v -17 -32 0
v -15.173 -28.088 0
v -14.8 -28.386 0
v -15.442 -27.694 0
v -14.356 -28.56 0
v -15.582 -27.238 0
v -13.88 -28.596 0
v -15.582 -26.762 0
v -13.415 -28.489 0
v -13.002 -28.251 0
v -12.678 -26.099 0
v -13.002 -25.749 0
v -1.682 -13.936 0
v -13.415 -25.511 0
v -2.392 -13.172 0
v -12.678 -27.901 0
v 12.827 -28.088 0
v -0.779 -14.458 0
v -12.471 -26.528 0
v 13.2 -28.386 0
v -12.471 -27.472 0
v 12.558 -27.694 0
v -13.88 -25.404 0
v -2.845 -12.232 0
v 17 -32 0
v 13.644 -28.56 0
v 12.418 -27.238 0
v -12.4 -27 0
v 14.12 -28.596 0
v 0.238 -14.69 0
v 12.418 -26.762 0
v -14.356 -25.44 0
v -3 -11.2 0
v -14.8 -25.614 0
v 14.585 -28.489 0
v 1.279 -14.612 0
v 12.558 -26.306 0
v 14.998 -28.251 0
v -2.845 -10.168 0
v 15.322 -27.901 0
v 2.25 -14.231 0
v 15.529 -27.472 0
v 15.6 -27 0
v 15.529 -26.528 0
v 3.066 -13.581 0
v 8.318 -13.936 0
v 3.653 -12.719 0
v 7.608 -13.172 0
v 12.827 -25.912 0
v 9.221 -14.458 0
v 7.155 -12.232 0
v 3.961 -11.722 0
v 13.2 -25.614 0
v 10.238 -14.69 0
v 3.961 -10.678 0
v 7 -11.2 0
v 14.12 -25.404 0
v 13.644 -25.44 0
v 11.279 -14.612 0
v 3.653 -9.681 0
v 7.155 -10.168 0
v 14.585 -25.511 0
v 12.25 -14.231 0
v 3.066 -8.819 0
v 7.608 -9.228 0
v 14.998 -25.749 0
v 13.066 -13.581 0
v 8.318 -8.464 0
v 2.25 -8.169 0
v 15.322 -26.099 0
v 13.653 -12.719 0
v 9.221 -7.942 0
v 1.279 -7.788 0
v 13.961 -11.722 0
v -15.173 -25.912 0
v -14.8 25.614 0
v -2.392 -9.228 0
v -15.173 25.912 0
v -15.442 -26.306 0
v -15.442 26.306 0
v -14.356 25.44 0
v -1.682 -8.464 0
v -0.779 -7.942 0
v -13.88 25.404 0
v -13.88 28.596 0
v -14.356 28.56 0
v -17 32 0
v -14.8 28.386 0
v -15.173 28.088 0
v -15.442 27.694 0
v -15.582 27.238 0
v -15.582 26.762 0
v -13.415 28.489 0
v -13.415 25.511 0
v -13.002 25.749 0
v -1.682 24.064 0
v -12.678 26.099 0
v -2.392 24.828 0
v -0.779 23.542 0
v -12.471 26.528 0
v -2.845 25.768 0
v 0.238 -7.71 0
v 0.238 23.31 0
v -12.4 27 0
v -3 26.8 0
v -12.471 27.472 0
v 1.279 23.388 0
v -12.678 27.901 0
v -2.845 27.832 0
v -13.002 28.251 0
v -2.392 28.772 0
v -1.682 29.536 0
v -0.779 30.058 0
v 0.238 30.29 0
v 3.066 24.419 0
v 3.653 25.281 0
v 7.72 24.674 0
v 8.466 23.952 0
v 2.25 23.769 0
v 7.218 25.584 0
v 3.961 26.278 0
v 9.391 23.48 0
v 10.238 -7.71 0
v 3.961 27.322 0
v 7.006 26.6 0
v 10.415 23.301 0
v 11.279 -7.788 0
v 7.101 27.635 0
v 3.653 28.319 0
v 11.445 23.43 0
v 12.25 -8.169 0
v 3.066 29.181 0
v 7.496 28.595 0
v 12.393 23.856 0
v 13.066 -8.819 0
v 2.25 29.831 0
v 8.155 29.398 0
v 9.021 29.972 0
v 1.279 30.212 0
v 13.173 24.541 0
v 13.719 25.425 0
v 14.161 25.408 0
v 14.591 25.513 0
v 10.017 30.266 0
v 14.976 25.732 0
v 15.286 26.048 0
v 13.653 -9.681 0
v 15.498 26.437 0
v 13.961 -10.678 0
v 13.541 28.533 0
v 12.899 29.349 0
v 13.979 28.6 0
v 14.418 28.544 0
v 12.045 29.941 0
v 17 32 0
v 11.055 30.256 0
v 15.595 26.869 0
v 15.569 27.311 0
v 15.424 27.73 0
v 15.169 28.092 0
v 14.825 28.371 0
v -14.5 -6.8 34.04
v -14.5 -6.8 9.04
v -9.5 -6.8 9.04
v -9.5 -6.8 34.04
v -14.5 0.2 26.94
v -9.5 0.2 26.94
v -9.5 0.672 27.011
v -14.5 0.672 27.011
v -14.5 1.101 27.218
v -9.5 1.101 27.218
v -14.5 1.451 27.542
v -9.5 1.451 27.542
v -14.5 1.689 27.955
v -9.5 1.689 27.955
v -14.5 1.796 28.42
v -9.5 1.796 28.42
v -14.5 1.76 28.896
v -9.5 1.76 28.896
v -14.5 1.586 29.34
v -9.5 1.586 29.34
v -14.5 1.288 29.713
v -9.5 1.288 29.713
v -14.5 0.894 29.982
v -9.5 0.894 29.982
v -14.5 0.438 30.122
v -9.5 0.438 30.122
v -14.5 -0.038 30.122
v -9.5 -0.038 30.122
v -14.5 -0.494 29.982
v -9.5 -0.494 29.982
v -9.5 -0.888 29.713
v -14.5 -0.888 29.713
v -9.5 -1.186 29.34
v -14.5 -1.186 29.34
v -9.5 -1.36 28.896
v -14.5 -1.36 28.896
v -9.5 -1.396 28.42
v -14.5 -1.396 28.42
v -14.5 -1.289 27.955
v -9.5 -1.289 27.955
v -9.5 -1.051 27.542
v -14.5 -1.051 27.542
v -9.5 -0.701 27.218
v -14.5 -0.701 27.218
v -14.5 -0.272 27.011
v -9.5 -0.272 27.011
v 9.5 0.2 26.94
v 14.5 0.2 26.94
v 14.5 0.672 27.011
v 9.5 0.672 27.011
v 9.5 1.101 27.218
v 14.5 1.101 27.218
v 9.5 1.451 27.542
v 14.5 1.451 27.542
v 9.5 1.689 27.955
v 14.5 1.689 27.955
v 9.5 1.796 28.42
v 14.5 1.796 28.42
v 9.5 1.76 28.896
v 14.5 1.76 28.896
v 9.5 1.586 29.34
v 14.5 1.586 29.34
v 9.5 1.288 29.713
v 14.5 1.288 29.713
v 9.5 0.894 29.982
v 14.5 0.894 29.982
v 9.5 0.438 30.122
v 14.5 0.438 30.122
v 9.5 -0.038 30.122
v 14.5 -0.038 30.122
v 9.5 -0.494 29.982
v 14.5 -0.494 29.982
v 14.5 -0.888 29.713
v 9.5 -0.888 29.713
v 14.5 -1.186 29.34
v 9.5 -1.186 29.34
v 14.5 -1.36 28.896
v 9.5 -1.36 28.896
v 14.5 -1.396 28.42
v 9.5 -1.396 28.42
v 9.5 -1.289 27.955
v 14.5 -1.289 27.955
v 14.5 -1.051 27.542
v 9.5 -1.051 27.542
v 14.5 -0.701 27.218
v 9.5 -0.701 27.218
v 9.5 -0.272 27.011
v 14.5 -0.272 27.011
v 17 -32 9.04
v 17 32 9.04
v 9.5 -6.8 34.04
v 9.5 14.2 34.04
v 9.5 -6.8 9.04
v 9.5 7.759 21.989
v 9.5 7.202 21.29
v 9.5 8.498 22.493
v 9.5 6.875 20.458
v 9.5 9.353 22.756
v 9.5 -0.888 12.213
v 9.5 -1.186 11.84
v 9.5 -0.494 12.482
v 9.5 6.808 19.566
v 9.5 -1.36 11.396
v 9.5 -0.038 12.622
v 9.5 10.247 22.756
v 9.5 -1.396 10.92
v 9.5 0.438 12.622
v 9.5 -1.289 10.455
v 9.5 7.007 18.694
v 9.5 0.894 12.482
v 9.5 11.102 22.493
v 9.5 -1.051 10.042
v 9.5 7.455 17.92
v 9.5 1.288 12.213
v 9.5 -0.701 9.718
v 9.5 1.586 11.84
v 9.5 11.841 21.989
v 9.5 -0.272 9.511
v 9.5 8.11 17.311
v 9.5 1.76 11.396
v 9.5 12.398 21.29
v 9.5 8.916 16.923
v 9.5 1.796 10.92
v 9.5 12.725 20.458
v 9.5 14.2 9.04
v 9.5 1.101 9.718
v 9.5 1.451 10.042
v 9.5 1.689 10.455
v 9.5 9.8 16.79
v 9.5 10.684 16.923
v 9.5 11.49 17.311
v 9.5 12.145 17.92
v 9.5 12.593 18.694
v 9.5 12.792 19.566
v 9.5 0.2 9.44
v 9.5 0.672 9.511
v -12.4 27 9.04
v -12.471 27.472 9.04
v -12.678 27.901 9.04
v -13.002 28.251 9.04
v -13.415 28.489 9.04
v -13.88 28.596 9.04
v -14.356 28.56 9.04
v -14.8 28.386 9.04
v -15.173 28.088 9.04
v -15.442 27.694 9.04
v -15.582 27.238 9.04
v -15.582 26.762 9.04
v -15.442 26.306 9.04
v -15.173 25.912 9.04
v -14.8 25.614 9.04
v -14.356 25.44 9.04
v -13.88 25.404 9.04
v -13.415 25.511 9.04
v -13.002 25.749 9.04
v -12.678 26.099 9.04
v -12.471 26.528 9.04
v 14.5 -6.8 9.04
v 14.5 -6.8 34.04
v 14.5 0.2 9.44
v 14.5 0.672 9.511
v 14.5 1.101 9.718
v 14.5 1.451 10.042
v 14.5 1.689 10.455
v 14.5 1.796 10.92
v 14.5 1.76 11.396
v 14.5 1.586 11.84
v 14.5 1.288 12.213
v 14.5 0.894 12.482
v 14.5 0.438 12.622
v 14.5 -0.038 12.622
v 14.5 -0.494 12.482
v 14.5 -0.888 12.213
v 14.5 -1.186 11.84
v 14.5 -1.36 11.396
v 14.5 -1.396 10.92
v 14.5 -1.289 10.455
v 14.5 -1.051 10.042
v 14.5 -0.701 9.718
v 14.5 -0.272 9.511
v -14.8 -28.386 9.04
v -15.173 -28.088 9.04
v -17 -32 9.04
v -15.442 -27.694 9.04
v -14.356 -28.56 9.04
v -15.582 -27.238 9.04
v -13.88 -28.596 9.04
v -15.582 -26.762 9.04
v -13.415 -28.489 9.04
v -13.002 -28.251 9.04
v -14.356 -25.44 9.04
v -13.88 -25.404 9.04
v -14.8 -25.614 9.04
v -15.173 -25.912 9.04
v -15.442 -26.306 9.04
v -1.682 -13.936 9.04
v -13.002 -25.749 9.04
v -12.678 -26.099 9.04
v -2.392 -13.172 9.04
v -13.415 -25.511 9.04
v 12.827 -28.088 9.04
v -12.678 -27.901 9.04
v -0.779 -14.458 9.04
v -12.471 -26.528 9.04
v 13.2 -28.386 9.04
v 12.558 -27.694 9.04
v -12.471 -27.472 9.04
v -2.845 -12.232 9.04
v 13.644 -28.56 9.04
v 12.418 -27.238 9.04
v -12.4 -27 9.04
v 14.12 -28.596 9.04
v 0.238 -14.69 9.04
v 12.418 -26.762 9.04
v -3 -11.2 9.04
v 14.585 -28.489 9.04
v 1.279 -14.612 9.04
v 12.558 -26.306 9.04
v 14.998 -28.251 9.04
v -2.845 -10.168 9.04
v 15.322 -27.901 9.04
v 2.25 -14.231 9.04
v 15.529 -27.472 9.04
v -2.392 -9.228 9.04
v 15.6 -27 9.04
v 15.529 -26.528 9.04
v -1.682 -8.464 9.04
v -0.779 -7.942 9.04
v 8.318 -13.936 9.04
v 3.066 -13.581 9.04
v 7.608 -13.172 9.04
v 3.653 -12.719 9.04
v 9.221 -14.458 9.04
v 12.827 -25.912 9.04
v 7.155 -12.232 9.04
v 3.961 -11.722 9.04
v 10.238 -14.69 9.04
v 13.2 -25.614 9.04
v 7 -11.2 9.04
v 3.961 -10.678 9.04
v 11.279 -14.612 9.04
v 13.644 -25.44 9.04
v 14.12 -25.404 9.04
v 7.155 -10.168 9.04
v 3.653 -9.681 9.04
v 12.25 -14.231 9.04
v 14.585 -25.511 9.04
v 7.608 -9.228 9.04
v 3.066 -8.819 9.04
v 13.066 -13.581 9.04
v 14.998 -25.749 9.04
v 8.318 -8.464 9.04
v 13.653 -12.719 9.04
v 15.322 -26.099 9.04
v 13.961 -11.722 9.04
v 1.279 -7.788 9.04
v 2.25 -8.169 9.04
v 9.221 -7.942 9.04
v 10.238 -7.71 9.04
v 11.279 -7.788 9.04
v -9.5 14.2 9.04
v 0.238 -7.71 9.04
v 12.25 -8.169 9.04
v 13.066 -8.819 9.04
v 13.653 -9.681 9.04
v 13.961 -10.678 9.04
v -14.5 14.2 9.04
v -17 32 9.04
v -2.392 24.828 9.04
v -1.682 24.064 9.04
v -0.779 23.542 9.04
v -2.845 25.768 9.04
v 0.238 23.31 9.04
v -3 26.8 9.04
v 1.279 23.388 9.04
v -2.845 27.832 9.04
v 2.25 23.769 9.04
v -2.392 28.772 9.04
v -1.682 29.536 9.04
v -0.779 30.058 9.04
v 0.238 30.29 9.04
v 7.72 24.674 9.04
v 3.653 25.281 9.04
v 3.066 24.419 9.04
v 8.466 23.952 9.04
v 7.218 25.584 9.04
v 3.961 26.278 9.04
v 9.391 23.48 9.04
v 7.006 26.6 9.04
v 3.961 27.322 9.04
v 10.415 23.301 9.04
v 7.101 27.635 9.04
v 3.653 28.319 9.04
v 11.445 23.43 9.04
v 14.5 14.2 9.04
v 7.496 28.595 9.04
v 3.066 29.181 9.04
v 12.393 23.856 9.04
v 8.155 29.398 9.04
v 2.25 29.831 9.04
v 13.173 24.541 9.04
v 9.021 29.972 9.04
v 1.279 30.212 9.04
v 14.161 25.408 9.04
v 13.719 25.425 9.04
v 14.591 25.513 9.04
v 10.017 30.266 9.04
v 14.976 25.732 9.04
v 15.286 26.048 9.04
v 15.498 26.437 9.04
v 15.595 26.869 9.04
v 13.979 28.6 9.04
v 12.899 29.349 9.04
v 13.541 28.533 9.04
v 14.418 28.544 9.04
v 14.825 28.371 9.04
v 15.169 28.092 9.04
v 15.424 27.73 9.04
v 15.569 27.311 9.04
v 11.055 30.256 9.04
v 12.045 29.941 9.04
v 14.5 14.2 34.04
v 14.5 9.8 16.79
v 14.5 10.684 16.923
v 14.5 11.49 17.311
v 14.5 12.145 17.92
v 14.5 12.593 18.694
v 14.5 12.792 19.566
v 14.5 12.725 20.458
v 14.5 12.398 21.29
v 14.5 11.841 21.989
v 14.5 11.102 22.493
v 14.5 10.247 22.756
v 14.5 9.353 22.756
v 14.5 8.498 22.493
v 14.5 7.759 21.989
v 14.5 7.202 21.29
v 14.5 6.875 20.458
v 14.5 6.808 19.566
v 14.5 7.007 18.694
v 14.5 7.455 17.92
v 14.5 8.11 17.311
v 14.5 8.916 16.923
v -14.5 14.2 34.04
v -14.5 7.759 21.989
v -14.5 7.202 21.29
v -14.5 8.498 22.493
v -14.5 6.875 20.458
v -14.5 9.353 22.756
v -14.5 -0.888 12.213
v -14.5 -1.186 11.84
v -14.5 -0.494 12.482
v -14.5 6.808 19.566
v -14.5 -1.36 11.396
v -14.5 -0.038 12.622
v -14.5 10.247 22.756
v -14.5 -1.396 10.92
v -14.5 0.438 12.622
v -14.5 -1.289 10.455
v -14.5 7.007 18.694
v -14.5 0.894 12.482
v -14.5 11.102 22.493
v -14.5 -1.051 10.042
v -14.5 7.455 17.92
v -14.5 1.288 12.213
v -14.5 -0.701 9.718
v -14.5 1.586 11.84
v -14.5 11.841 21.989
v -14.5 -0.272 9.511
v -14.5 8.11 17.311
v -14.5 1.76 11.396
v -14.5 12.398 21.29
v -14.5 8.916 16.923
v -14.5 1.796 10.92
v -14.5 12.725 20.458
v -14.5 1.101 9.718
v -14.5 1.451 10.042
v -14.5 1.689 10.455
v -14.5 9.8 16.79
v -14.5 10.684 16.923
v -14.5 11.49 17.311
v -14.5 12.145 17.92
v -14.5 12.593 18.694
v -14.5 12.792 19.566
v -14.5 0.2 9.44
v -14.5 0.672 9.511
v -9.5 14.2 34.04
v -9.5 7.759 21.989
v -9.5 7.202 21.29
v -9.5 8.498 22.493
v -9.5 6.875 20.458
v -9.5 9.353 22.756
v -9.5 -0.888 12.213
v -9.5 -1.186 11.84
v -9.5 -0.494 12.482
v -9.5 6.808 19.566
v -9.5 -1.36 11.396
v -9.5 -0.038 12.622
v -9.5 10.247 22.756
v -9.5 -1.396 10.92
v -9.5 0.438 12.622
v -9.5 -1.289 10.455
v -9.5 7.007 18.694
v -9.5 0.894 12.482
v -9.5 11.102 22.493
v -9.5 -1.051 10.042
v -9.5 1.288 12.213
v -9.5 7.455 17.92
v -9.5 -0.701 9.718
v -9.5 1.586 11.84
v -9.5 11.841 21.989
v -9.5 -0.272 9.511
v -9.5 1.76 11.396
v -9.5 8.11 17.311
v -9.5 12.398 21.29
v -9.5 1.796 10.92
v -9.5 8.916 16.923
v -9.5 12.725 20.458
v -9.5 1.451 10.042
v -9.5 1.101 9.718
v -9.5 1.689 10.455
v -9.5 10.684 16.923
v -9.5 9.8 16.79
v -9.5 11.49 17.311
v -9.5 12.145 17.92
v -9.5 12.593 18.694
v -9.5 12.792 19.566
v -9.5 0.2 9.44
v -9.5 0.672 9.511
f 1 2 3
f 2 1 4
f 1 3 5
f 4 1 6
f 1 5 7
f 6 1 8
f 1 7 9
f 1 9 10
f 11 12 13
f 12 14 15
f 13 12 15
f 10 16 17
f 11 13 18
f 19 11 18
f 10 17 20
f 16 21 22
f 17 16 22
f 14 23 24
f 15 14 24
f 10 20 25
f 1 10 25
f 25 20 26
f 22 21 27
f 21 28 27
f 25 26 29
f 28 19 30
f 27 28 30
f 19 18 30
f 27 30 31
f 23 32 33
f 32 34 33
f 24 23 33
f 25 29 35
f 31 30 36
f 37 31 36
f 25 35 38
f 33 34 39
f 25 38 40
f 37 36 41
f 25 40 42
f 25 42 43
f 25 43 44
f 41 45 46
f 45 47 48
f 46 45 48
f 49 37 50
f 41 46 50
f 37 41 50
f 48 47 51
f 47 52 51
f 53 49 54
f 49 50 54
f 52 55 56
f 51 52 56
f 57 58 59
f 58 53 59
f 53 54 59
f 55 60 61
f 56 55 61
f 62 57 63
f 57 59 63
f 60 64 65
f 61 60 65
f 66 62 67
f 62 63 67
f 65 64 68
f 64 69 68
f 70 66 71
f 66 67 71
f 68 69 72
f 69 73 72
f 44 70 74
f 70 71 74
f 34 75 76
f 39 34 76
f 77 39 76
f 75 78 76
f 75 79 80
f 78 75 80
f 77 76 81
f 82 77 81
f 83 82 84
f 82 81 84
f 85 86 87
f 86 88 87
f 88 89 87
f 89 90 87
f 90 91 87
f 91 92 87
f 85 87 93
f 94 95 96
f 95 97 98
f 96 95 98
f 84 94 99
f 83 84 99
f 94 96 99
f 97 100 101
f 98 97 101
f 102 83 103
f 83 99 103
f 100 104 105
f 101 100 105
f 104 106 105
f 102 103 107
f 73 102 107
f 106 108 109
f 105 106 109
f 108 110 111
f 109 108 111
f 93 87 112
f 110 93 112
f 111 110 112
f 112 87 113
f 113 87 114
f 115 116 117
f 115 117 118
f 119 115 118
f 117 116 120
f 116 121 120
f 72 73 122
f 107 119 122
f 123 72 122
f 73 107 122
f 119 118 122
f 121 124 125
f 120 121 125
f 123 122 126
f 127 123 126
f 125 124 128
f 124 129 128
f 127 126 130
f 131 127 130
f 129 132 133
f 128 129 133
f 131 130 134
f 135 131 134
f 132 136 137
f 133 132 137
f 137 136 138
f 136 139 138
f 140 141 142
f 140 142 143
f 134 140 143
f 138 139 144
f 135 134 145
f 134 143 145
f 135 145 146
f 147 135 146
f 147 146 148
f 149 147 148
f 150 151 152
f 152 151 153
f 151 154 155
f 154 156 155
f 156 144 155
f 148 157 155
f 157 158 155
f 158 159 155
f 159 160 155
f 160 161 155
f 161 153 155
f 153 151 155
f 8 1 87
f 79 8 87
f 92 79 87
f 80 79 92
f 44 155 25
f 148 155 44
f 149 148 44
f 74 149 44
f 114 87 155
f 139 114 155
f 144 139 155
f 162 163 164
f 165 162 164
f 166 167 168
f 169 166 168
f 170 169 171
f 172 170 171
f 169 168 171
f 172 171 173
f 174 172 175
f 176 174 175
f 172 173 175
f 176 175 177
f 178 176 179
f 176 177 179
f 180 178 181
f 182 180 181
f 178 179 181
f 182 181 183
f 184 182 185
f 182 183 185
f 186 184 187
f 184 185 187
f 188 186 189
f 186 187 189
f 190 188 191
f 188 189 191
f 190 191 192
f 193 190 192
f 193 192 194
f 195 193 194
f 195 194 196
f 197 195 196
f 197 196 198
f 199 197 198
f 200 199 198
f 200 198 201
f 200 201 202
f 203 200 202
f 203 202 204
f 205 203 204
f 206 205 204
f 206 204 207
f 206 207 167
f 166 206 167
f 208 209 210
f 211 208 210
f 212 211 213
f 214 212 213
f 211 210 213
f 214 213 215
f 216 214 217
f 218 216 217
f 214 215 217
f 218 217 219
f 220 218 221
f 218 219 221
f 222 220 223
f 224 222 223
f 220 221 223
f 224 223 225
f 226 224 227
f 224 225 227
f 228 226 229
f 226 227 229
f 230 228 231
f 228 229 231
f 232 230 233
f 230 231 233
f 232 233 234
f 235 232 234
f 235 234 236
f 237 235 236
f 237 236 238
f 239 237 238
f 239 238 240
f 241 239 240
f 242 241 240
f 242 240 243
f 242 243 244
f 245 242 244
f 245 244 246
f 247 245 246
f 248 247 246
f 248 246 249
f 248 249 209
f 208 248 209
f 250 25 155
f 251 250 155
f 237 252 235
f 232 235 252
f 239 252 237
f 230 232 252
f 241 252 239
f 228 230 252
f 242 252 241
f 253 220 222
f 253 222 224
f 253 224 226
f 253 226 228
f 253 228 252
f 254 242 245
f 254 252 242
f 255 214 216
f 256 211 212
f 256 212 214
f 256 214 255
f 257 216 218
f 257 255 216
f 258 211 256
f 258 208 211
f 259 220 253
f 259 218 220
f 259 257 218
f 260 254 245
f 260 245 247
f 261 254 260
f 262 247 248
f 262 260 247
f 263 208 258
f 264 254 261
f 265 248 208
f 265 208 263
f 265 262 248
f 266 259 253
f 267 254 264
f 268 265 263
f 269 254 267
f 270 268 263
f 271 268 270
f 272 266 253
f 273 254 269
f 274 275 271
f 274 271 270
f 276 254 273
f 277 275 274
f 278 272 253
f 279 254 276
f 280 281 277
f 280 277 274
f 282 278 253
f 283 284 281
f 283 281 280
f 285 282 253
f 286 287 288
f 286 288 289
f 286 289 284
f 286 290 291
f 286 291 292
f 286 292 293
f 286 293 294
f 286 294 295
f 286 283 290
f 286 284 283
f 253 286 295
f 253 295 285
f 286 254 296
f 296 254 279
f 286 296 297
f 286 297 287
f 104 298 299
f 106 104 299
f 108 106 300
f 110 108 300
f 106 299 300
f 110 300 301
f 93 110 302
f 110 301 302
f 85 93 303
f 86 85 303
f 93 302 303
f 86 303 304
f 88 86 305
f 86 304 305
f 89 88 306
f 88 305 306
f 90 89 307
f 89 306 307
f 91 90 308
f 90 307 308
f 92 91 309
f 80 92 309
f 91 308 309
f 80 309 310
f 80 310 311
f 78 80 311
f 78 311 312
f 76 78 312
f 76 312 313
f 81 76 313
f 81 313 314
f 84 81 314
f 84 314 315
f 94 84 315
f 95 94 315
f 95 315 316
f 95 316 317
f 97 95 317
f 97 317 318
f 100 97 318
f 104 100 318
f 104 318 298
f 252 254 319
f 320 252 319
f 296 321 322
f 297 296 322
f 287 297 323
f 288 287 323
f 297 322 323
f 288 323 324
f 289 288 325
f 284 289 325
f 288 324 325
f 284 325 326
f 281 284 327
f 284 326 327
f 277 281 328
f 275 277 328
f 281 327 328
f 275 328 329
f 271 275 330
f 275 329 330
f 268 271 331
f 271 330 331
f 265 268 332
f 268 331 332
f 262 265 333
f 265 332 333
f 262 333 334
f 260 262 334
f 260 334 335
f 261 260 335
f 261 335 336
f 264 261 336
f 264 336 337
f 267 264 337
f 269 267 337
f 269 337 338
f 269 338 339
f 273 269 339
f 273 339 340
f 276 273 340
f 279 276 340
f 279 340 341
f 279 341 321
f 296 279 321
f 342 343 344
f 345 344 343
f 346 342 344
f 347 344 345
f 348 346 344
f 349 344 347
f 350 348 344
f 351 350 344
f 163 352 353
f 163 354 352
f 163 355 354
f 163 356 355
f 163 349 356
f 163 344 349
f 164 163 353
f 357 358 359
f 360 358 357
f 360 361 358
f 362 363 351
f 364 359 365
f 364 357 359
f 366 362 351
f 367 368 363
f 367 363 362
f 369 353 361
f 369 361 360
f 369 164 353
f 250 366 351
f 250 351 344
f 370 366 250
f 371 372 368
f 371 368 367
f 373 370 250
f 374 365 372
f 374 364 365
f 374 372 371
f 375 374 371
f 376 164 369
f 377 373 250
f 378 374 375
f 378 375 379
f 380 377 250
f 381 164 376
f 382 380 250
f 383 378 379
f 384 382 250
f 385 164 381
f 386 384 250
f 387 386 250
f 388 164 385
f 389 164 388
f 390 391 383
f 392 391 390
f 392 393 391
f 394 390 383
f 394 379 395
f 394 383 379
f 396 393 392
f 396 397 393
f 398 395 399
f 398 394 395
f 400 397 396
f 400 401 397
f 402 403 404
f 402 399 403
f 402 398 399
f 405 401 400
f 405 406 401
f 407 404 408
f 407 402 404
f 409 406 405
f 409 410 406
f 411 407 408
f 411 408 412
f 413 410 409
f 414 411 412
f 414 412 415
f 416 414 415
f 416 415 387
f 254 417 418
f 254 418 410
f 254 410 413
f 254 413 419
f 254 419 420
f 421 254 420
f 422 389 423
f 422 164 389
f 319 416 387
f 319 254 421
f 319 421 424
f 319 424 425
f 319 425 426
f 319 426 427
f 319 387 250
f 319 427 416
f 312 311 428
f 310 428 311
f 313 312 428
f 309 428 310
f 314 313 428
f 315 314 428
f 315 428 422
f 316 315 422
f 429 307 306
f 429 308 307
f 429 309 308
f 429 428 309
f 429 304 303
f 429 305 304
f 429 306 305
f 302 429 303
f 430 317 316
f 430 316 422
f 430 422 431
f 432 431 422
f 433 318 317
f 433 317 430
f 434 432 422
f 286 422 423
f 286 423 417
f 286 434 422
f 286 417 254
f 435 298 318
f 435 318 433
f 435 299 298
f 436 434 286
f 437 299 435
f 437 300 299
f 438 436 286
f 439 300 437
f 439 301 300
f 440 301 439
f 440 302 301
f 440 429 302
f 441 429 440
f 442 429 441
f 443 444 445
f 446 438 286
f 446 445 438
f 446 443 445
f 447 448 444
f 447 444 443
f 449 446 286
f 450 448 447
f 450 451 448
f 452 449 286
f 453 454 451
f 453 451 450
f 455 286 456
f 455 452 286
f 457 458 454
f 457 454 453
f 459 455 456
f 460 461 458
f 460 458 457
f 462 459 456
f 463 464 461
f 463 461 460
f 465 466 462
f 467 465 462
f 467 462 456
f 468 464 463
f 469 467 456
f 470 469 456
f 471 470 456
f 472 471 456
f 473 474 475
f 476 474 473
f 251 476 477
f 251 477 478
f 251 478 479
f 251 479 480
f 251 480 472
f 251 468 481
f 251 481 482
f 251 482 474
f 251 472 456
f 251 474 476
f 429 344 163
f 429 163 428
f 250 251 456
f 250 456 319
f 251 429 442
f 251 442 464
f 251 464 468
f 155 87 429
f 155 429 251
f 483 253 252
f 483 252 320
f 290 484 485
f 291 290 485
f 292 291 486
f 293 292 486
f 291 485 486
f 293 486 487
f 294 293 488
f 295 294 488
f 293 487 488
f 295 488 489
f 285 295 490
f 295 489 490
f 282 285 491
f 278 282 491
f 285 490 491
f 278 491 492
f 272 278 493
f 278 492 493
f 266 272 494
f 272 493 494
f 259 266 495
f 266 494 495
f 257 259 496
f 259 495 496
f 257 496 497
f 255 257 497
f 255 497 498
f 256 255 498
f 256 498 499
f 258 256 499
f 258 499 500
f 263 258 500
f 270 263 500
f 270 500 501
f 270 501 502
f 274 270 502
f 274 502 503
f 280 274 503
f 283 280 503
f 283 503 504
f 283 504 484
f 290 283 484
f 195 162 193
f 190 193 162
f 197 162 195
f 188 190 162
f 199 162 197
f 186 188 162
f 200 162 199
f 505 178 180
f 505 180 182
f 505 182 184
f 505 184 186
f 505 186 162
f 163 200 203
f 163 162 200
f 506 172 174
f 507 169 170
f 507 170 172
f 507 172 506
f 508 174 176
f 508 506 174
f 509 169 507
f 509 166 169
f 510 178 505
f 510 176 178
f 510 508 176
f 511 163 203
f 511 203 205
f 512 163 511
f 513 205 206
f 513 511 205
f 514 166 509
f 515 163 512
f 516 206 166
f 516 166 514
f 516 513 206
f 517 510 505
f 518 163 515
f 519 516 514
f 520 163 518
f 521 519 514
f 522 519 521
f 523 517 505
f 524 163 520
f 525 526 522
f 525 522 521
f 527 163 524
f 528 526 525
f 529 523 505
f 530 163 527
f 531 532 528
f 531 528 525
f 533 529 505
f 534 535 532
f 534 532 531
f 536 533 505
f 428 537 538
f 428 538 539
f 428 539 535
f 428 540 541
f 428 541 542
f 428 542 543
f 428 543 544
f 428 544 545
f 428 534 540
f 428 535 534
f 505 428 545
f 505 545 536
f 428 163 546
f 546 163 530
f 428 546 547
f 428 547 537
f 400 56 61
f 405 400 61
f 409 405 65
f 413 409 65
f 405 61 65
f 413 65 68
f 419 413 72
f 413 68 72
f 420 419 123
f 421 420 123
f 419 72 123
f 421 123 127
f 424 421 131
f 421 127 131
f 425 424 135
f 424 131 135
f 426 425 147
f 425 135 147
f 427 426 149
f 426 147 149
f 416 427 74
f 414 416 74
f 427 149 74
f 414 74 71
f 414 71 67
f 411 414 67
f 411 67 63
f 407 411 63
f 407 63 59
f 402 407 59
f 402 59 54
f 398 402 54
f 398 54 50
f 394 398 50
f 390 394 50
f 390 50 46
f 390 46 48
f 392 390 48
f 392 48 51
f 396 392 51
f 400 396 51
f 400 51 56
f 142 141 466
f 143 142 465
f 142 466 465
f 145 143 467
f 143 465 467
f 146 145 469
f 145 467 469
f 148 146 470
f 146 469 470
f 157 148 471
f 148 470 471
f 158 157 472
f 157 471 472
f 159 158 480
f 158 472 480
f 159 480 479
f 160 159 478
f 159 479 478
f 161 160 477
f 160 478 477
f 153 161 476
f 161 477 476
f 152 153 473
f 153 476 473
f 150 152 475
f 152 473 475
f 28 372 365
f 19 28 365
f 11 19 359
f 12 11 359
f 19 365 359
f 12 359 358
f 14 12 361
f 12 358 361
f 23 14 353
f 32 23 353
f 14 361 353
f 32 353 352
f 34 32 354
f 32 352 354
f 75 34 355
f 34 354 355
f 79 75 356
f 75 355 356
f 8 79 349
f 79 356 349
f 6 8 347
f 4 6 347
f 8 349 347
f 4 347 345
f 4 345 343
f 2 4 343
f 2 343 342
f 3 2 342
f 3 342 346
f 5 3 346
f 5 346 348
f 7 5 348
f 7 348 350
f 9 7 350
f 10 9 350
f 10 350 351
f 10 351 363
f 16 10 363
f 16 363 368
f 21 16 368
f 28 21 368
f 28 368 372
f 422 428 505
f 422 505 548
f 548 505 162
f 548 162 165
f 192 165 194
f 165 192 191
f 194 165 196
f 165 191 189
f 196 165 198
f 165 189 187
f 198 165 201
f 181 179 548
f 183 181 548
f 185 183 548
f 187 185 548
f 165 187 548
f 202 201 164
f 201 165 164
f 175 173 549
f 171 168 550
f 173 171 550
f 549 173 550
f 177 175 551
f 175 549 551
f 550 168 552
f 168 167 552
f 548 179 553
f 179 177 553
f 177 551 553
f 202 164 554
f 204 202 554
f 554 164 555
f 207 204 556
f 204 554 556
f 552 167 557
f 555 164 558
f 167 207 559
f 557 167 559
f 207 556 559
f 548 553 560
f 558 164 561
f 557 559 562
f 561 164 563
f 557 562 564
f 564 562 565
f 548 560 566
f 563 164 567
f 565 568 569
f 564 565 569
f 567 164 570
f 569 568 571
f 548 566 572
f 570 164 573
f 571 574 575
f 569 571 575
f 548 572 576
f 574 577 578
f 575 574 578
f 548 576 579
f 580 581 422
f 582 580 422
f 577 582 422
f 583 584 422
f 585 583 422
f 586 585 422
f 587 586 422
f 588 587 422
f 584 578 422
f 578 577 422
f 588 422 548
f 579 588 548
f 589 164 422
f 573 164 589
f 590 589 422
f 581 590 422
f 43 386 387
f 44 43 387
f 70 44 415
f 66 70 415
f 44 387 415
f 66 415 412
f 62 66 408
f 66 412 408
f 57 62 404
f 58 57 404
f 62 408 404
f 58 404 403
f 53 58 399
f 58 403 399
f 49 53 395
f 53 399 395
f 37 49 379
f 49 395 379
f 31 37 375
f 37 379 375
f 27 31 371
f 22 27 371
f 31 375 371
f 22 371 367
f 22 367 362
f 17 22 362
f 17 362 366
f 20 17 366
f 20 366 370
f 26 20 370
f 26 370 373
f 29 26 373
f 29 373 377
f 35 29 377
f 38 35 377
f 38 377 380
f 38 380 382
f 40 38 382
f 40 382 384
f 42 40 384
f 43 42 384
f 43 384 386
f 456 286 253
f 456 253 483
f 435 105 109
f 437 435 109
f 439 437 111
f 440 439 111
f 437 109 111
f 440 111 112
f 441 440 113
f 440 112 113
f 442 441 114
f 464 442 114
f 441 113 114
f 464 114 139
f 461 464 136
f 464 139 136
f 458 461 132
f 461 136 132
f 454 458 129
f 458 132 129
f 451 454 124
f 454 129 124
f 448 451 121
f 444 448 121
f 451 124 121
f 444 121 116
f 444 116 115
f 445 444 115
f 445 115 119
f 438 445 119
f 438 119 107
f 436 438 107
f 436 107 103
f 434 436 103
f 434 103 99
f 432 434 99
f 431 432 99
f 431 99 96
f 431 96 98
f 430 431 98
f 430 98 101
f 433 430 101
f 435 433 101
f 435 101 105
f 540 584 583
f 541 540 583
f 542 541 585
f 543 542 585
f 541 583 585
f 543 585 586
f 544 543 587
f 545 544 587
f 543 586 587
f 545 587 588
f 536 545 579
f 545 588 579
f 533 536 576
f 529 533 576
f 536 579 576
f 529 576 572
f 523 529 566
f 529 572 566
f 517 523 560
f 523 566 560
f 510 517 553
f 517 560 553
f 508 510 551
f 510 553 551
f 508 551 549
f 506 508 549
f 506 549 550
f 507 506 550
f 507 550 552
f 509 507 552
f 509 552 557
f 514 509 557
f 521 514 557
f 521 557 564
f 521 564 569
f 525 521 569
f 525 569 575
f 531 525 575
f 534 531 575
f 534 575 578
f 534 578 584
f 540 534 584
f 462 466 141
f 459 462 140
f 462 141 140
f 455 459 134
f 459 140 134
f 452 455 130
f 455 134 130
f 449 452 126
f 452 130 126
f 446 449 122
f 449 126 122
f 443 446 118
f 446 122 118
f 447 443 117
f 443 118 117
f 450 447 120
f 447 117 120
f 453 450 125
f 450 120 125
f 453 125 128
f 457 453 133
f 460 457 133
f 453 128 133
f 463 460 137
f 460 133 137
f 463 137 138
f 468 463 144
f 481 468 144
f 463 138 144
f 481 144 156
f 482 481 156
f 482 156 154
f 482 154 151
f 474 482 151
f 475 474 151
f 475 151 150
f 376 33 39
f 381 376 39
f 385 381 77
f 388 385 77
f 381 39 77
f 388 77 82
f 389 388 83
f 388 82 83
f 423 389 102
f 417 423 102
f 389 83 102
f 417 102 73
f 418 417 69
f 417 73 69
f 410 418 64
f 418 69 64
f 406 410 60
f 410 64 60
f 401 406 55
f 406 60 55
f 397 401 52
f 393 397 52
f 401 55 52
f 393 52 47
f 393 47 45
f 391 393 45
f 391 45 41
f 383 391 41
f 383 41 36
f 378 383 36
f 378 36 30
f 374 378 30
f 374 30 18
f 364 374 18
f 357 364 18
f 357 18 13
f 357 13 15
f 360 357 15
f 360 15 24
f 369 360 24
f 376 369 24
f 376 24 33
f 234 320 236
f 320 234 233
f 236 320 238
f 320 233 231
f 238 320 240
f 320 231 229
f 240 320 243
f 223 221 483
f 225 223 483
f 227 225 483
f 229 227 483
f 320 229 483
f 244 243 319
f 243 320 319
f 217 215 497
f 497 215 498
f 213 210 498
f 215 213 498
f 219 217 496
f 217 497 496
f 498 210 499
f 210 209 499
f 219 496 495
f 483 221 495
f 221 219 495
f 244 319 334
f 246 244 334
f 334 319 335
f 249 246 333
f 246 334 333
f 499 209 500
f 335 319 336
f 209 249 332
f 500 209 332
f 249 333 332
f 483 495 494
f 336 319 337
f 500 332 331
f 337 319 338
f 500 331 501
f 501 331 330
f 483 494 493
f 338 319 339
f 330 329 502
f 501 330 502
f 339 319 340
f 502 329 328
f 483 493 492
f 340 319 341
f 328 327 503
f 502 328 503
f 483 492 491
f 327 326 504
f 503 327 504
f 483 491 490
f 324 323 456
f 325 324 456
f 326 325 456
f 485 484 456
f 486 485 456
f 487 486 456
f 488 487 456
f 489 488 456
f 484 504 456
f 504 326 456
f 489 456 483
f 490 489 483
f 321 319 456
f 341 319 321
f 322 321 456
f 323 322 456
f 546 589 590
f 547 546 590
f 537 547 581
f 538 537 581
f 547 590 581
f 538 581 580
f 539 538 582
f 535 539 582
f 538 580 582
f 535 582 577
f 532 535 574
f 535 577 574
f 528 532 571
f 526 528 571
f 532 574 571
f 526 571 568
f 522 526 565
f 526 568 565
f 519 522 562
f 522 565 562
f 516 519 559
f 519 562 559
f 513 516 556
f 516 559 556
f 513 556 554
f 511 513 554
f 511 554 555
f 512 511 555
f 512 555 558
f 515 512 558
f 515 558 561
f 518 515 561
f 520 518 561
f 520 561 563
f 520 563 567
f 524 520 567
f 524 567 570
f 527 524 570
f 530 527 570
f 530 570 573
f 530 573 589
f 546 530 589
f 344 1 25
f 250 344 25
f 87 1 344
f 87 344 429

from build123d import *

# Parameters (mm, degrees)
SKETCH1_W           = 34
SKETCH1_H           = 64
BOSS_EXTRUDE1_DEPTH = 9.04
SKETCH2_W           = 5
SKETCH2_H           = 21
BOSS_EXTRUDE2_DEPTH = 25
SKETCH3_R           = 1.6
SKETCH3_R_2         = 3
CUT_EXTRUDE1_DEPTH  = 30
SKETCH4_R           = 1.6
CUT_EXTRUDE2_DEPTH  = 10
SKETCH5_R           = 3.5
CUT_EXTRUDE3_DEPTH  = 10


with BuildPart() as part:
    # Sketch1 → Boss-Extrude1 (new body)
    with BuildSketch(Plane.XY):
        Rectangle(SKETCH1_W, SKETCH1_H)
    extrude(amount=BOSS_EXTRUDE1_DEPTH)

    # Sketch2 → Boss-Extrude2 (add)
    with BuildSketch(Plane.XY.offset(9.04)):
        with Locations((12, 3.7)):
            Rectangle(SKETCH2_W, SKETCH2_H)
        with Locations((-12, 3.7)):
            Rectangle(SKETCH2_W, SKETCH2_H)
    extrude(amount=BOSS_EXTRUDE2_DEPTH)

    # Sketch3 → Cut-Extrude1 (cut)
    with BuildSketch(Plane(origin=(14.5, 0, 0), x_dir=(0, 0, -1), z_dir=(1, 0, 0))):
        with Locations((-28.54, 0.2)):
            Circle(SKETCH3_R)
        with Locations((-11.04, 0.2)):
            Circle(SKETCH3_R)
        with Locations((-19.79, 9.8)):
            Circle(SKETCH3_R_2)
    extrude(amount=-CUT_EXTRUDE1_DEPTH, mode=Mode.SUBTRACT)

    # Sketch4 → Cut-Extrude2 (cut)
    with BuildSketch(Plane.XY.offset(9.04)):
        with Locations((-14, -27)):
            Circle(SKETCH4_R)
        with Locations((-14, 27)):
            Circle(SKETCH4_R)
        with Locations((14, -27)):
            Circle(SKETCH4_R)
        with Locations((14, 27)):
            Circle(SKETCH4_R)
    extrude(amount=-CUT_EXTRUDE2_DEPTH, mode=Mode.SUBTRACT)

    # Sketch5 → Cut-Extrude3 (cut)
    with BuildSketch(Plane(origin=(0, 0, 0), x_dir=(-1, 0, 0), z_dir=(0, 0, -1))):
        with Locations((-0.5, 26.8)):
            Circle(SKETCH5_R)
        with Locations((-10.5, 26.8)):
            Circle(SKETCH5_R)
        with Locations((-0.5, -11.2)):
            Circle(SKETCH5_R)
        with Locations((-10.5, -11.2)):
            Circle(SKETCH5_R)
    extrude(amount=-CUT_EXTRUDE3_DEPTH, mode=Mode.SUBTRACT)


solid = part.part
